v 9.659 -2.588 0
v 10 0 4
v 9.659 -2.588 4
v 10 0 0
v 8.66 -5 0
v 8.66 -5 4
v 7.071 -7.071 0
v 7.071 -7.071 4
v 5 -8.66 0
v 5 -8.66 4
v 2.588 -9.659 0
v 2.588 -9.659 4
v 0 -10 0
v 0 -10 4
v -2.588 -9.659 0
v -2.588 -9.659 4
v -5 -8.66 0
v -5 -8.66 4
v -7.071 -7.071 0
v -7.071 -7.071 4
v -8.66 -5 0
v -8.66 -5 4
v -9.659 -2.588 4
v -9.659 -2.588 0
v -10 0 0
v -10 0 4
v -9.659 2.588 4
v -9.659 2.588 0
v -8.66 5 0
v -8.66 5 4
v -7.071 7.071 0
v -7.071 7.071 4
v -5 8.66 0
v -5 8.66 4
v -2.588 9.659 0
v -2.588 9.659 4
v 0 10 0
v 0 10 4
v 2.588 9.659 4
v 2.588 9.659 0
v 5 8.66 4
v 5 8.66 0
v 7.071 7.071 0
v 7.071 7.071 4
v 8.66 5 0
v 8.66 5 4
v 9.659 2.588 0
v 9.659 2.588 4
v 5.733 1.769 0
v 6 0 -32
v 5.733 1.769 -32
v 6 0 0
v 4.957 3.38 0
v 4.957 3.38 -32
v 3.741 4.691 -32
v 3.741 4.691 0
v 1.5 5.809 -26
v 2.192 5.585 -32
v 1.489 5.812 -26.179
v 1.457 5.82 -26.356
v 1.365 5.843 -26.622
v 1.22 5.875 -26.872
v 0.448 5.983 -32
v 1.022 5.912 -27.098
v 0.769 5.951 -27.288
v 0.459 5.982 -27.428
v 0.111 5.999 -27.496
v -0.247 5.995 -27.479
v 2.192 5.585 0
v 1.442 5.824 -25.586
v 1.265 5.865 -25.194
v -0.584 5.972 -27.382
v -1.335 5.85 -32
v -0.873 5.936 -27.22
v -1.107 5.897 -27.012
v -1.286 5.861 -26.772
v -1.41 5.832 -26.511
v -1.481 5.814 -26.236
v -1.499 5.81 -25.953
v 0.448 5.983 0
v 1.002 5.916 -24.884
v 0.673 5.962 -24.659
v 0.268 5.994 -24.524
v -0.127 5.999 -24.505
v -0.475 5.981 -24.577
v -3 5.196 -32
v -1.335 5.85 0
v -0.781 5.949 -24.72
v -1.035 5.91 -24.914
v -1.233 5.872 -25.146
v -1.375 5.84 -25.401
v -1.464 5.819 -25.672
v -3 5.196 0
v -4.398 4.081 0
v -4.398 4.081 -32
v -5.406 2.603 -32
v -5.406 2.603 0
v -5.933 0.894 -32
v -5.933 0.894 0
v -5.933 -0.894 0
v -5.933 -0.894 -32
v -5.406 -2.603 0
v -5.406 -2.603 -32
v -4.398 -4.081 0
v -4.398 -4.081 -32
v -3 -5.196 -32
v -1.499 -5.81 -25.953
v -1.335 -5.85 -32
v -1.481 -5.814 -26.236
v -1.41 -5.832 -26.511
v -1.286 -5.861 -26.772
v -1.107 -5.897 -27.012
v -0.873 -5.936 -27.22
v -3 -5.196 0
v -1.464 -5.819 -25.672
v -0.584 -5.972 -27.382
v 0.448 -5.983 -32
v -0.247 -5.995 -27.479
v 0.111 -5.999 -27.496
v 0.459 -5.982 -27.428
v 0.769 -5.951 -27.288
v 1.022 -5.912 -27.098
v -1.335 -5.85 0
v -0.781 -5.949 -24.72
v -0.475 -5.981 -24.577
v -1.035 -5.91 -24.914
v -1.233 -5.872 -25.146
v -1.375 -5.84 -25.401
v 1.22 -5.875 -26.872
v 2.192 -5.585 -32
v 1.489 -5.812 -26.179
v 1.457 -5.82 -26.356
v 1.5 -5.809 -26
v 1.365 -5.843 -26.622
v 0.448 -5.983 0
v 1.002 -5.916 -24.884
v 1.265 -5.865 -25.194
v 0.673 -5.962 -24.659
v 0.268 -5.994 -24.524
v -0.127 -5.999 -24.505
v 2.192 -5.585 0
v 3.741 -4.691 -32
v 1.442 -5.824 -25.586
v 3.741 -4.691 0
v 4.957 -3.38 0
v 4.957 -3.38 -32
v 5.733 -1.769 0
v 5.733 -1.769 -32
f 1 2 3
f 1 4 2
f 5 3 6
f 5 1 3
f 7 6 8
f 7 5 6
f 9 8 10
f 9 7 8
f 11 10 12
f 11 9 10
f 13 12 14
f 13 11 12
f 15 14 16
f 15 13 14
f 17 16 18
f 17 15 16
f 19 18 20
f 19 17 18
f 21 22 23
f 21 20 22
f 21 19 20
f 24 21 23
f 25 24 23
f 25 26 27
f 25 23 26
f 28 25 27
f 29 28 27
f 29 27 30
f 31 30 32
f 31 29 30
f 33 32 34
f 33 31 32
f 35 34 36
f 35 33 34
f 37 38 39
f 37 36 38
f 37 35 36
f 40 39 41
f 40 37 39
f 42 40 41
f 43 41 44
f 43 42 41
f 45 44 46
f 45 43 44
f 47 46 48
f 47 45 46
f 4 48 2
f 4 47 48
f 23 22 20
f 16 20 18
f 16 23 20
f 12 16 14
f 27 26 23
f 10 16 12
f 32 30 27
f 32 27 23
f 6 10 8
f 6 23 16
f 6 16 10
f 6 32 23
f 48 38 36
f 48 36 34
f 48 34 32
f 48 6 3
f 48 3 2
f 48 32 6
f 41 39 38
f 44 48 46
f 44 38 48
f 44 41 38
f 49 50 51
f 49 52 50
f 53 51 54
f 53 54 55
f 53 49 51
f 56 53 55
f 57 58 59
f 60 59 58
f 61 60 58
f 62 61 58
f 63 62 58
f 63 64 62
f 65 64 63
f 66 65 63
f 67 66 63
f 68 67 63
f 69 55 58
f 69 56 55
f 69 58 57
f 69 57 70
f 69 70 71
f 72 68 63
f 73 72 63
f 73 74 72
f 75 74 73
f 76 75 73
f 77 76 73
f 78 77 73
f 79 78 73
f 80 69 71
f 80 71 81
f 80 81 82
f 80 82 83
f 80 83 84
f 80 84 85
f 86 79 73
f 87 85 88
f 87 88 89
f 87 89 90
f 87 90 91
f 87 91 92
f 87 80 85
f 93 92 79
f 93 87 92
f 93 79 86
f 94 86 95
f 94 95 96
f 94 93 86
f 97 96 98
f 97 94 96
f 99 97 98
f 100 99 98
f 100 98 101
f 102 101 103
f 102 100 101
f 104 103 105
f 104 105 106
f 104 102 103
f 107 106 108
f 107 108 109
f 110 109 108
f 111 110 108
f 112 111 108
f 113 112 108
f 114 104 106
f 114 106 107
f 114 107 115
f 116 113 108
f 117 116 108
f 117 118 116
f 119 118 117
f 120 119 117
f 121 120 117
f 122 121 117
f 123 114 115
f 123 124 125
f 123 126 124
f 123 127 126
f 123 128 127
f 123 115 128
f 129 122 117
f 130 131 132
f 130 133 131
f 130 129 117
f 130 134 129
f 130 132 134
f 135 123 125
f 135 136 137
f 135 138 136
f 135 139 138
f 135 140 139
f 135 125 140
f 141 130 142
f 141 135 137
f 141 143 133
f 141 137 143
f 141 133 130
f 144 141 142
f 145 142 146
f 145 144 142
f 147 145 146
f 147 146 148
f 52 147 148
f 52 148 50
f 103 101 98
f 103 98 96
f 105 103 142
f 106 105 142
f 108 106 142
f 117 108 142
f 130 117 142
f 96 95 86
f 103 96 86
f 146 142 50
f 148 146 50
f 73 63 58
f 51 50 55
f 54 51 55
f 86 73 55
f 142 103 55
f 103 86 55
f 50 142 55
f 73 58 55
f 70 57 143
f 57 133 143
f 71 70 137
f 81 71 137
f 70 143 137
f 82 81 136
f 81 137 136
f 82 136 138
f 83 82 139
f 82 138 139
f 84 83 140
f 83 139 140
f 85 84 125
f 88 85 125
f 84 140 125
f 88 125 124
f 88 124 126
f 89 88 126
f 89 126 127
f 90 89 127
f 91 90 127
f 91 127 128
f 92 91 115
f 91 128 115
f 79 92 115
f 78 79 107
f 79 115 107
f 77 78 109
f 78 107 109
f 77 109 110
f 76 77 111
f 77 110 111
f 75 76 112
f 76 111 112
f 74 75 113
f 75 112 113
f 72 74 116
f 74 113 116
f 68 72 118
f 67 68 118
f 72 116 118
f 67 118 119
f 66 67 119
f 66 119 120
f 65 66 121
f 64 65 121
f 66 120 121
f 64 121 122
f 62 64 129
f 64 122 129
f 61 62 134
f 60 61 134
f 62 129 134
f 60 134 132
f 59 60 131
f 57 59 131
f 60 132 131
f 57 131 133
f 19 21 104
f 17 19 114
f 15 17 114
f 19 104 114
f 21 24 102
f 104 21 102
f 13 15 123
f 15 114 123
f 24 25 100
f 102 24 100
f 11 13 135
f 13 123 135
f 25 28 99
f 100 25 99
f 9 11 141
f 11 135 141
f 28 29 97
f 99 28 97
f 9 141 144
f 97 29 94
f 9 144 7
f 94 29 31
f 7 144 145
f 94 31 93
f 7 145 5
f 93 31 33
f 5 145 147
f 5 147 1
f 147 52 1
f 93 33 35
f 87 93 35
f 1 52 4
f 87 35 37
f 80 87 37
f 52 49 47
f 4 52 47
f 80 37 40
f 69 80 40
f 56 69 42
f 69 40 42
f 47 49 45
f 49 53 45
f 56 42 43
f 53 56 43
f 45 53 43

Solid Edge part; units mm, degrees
sketch "Sketch1" plane through (0, 0, 0) normal (0, 0, 1) x (1, 0, 0)
  circle A0 centre (0, 0) radius 10
extrude "Protrusion1" add sketch "Sketch1" along normal blind 4
sketch "Sketch2" plane through (0, 0, 0) normal (0, 0, 1) x (1, 0, 0)
  circle A0 centre (0, 0) radius 6
extrude "ExtrudedProtrusion_2" add sketch "Sketch2" against normal blind 32
sketch "Sketch3" plane through (0, 0, 0) normal (0, -1, 0) x (1, 0, 0)
  circle A0 centre (0, -26) radius 1.5
extrude "ExtrudedCutout_1" cut sketch "Sketch3" along normal mid plane 639.6165
properties part number "8"
